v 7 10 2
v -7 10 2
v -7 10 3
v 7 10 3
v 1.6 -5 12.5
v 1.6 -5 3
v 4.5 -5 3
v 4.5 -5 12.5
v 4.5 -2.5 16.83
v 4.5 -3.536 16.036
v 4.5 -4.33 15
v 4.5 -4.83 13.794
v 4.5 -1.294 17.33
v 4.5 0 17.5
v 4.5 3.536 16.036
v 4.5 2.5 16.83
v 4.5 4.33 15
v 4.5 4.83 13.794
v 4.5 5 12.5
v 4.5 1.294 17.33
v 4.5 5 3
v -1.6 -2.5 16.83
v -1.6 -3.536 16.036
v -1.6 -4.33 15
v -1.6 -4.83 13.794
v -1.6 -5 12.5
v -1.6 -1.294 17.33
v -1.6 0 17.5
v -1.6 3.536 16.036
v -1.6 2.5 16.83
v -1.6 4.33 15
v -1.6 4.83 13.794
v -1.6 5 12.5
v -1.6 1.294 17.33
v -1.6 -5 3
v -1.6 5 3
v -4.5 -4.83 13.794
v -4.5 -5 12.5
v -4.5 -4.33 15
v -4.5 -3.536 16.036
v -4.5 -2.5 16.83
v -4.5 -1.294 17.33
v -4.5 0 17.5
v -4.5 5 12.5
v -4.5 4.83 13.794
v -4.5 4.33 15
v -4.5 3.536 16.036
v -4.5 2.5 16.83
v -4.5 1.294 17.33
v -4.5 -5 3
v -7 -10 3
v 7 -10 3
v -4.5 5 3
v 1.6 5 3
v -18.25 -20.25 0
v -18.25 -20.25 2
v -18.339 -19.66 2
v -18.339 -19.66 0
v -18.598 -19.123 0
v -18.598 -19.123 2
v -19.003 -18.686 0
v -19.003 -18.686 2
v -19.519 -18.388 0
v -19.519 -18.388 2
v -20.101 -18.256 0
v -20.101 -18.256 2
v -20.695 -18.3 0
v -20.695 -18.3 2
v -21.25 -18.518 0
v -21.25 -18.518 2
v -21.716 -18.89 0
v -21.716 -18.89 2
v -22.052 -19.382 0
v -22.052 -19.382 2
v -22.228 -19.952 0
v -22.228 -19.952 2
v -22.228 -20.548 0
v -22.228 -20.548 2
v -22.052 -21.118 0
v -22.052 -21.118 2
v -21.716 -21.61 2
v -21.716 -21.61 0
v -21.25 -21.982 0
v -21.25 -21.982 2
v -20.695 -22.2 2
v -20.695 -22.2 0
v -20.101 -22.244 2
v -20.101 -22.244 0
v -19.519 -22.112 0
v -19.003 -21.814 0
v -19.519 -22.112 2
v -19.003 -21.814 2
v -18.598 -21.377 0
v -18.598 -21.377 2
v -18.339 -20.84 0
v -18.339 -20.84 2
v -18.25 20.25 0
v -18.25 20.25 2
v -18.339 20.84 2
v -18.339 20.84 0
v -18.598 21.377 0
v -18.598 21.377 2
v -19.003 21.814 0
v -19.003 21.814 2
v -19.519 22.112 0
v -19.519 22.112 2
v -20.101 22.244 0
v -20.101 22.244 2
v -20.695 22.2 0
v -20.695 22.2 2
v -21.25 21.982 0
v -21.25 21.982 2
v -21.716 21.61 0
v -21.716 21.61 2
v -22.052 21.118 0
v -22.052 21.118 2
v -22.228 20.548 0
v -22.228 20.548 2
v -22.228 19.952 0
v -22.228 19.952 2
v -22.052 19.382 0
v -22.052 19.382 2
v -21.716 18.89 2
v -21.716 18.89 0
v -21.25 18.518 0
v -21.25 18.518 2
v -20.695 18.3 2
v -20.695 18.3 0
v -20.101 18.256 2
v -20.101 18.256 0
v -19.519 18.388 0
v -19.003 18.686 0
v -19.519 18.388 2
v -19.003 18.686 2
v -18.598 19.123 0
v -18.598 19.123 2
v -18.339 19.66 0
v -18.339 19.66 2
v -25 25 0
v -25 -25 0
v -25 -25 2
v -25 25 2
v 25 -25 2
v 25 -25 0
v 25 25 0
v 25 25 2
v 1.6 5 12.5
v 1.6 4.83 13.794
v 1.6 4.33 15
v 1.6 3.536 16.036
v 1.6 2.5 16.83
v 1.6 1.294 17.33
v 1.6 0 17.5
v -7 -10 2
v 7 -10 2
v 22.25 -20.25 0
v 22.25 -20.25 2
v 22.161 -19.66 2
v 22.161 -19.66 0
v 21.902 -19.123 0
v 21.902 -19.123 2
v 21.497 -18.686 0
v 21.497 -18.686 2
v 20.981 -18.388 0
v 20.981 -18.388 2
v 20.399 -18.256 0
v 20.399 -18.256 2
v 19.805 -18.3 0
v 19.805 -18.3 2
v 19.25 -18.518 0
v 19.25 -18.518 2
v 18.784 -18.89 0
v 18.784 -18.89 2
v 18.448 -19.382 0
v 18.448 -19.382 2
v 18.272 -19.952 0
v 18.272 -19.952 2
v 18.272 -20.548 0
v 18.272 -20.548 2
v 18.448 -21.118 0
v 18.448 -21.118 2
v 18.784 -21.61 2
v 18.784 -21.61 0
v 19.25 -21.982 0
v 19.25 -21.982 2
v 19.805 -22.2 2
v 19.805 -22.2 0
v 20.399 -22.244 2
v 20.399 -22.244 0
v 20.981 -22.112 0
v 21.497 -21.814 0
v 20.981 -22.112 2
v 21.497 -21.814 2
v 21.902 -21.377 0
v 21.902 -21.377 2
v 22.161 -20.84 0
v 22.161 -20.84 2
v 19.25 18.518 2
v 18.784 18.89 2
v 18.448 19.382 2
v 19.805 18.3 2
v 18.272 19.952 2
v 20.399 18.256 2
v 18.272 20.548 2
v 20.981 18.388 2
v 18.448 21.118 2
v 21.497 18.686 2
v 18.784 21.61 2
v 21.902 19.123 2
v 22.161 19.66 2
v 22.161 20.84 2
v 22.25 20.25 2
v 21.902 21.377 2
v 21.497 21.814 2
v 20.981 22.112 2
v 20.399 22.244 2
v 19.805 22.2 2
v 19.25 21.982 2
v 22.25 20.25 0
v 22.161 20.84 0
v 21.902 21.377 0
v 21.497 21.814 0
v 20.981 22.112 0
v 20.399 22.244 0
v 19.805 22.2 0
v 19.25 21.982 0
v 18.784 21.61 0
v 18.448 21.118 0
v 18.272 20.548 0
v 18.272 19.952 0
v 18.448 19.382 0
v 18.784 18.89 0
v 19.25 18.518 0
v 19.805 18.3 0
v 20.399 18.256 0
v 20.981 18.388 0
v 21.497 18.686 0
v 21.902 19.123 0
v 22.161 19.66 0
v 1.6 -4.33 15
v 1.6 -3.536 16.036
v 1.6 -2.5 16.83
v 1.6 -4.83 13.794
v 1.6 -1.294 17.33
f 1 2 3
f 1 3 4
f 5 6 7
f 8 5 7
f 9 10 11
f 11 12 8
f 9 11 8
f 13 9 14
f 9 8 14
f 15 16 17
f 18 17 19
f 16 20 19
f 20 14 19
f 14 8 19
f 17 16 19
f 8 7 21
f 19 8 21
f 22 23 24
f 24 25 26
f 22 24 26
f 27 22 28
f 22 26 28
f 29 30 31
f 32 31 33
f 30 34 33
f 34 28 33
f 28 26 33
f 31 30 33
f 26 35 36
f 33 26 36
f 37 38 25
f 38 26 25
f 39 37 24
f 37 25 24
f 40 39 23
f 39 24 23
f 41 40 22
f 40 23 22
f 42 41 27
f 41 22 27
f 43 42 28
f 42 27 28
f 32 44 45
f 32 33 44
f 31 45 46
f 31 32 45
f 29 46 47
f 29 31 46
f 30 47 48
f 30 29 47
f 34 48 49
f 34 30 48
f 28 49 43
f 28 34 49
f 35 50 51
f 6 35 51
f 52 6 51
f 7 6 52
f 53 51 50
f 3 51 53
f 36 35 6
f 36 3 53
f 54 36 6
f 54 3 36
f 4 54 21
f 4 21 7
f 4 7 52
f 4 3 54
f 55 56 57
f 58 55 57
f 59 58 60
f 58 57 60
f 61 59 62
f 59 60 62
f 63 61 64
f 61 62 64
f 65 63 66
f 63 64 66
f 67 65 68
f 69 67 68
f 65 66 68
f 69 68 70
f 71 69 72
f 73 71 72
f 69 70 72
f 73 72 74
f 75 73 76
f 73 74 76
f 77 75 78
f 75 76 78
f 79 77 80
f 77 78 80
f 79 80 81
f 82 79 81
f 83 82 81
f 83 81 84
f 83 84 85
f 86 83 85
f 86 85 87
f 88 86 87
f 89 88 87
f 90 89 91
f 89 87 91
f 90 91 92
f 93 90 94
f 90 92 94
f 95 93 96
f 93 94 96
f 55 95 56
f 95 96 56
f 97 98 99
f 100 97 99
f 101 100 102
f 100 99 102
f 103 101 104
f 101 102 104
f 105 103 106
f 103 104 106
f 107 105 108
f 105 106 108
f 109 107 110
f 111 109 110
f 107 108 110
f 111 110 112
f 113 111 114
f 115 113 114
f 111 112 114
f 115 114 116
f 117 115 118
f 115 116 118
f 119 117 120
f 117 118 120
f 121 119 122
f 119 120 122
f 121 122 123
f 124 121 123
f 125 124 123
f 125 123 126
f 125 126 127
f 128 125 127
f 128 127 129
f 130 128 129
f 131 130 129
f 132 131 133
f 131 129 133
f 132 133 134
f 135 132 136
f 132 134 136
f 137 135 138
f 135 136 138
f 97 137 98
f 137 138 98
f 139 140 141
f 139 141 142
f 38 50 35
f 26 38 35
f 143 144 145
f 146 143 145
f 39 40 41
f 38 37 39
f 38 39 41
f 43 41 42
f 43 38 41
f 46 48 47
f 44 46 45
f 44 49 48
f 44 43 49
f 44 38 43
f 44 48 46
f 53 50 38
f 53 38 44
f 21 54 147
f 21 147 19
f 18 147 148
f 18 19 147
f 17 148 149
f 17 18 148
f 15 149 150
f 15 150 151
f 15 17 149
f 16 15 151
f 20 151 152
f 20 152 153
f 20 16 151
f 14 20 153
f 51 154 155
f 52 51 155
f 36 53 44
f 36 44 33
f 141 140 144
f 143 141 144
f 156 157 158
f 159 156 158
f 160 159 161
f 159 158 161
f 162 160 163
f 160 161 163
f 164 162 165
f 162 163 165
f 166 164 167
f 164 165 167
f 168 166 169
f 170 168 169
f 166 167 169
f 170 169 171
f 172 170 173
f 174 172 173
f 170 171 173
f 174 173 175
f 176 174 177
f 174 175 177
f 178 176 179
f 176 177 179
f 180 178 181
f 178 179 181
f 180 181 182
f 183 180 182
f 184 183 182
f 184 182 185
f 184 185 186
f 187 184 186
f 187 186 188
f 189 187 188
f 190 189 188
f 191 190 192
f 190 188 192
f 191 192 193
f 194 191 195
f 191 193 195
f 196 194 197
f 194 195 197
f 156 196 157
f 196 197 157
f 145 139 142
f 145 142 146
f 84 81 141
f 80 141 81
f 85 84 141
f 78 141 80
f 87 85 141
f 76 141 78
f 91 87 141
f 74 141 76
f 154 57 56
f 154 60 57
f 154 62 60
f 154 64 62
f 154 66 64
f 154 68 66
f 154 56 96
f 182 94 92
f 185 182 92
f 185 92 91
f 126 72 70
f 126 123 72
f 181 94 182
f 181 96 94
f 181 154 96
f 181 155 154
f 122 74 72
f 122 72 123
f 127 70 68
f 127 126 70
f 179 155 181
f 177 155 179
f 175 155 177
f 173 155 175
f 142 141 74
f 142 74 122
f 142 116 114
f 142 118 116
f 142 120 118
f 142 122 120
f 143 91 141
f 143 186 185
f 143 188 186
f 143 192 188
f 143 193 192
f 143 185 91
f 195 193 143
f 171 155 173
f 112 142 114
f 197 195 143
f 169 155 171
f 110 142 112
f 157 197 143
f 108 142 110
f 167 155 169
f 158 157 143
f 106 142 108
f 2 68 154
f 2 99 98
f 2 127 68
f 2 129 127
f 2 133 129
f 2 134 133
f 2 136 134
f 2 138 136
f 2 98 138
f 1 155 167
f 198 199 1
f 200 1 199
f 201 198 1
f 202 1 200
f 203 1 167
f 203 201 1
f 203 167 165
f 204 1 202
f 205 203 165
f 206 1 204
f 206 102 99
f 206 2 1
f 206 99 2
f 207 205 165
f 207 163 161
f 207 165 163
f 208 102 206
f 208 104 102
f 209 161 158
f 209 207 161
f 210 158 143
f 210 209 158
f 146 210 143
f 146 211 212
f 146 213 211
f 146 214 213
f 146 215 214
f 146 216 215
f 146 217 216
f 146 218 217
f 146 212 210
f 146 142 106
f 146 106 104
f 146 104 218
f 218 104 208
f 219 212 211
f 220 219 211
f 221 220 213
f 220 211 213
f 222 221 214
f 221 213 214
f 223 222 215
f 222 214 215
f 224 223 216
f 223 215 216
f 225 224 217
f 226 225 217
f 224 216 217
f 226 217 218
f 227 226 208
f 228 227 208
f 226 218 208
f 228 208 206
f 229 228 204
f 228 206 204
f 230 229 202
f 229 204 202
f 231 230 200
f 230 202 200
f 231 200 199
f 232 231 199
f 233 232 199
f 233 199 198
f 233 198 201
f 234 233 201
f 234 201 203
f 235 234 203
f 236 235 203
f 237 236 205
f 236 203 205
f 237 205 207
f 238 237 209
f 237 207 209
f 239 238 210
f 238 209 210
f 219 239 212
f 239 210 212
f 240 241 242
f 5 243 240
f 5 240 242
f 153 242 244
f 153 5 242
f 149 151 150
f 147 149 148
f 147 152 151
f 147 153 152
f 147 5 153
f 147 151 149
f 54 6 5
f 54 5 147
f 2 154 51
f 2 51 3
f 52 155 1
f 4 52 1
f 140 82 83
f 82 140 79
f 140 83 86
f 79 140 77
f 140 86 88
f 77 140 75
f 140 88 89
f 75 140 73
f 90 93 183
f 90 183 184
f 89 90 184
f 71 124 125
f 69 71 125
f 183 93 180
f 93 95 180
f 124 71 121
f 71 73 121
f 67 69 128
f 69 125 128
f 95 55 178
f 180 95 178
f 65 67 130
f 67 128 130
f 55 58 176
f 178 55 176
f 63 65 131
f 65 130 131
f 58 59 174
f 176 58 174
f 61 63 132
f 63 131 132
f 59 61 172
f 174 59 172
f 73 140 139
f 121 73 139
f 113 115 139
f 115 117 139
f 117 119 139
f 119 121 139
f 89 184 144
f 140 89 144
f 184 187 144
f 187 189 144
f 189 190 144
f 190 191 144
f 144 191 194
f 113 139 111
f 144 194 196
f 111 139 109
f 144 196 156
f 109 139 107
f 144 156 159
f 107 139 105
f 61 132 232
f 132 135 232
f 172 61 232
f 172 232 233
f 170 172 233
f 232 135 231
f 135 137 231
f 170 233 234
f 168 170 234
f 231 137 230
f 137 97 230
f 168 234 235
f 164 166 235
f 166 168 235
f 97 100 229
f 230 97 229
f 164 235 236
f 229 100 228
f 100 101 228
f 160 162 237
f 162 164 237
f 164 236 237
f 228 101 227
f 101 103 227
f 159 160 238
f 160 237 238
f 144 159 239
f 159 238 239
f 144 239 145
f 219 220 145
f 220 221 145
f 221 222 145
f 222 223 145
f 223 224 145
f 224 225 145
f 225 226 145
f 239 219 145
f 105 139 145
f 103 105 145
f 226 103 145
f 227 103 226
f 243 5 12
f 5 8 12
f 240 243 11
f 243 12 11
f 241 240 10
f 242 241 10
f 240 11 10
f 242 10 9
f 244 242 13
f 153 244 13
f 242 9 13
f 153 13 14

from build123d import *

# Parameters (mm, degrees)
F0_W     = 50
F0_H     = 50
F1_DEPTH = 2
F2_R     = 2
F3_DEPTH = 2
F4_W     = 14
F4_H     = 20
F5_DEPTH = 1
F6_W     = 2.9
F6_H     = 10
F7_DEPTH = 14.5
F8_R     = 4.99999


# Not quite as in the source:
# - a fillet or chamfer is up to 0.001 mm smaller than in the source, because OpenCascade refuses the exact size


with BuildPart() as f1:
    # F0 (on Top) → F1 (new body)
    with BuildSketch(Plane.XY):
        Rectangle(F0_W, F0_H)
    extrude(amount=F1_DEPTH)

    # F2 (on face) → F3 (cut)
    with BuildSketch(Plane.XY.offset(2)):
        with Locations((-20.25, 20.25)):
            Circle(F2_R)
        with Locations((20.25, 20.25)):
            Circle(F2_R)
        with Locations((20.25, -20.25)):
            Circle(F2_R)
        with Locations((-20.25, -20.25)):
            Circle(F2_R)
    extrude(amount=-F3_DEPTH, mode=Mode.SUBTRACT)

    # F4 (on face) → F5 (join)
    with BuildSketch(Plane.XY.offset(2)):
        Rectangle(F4_W, F4_H)
    extrude(amount=F5_DEPTH)

    # F6 (on face) → F7 (join)
    with BuildSketch(Plane.XY.offset(3)):
        with Locations((3.05, 0)):
            Rectangle(F6_W, F6_H)
        with Locations((-3.05, 0)):
            Rectangle(F6_W, F6_H)
    extrude(amount=F7_DEPTH)

    # F8 (radius 5 in the source; OpenCascade refuses exactly that, so slightly less here)
    f8_edges = [f1.edges().sort_by_distance(p)[0] for p in [
        (-3.05, 5, 17.5),
        (3.05, 5, 17.5),
        (3.05, -5, 17.5),
        (-3.05, -5, 17.5),
    ]]
    fillet(f8_edges, radius=F8_R)


solid = f1.part
